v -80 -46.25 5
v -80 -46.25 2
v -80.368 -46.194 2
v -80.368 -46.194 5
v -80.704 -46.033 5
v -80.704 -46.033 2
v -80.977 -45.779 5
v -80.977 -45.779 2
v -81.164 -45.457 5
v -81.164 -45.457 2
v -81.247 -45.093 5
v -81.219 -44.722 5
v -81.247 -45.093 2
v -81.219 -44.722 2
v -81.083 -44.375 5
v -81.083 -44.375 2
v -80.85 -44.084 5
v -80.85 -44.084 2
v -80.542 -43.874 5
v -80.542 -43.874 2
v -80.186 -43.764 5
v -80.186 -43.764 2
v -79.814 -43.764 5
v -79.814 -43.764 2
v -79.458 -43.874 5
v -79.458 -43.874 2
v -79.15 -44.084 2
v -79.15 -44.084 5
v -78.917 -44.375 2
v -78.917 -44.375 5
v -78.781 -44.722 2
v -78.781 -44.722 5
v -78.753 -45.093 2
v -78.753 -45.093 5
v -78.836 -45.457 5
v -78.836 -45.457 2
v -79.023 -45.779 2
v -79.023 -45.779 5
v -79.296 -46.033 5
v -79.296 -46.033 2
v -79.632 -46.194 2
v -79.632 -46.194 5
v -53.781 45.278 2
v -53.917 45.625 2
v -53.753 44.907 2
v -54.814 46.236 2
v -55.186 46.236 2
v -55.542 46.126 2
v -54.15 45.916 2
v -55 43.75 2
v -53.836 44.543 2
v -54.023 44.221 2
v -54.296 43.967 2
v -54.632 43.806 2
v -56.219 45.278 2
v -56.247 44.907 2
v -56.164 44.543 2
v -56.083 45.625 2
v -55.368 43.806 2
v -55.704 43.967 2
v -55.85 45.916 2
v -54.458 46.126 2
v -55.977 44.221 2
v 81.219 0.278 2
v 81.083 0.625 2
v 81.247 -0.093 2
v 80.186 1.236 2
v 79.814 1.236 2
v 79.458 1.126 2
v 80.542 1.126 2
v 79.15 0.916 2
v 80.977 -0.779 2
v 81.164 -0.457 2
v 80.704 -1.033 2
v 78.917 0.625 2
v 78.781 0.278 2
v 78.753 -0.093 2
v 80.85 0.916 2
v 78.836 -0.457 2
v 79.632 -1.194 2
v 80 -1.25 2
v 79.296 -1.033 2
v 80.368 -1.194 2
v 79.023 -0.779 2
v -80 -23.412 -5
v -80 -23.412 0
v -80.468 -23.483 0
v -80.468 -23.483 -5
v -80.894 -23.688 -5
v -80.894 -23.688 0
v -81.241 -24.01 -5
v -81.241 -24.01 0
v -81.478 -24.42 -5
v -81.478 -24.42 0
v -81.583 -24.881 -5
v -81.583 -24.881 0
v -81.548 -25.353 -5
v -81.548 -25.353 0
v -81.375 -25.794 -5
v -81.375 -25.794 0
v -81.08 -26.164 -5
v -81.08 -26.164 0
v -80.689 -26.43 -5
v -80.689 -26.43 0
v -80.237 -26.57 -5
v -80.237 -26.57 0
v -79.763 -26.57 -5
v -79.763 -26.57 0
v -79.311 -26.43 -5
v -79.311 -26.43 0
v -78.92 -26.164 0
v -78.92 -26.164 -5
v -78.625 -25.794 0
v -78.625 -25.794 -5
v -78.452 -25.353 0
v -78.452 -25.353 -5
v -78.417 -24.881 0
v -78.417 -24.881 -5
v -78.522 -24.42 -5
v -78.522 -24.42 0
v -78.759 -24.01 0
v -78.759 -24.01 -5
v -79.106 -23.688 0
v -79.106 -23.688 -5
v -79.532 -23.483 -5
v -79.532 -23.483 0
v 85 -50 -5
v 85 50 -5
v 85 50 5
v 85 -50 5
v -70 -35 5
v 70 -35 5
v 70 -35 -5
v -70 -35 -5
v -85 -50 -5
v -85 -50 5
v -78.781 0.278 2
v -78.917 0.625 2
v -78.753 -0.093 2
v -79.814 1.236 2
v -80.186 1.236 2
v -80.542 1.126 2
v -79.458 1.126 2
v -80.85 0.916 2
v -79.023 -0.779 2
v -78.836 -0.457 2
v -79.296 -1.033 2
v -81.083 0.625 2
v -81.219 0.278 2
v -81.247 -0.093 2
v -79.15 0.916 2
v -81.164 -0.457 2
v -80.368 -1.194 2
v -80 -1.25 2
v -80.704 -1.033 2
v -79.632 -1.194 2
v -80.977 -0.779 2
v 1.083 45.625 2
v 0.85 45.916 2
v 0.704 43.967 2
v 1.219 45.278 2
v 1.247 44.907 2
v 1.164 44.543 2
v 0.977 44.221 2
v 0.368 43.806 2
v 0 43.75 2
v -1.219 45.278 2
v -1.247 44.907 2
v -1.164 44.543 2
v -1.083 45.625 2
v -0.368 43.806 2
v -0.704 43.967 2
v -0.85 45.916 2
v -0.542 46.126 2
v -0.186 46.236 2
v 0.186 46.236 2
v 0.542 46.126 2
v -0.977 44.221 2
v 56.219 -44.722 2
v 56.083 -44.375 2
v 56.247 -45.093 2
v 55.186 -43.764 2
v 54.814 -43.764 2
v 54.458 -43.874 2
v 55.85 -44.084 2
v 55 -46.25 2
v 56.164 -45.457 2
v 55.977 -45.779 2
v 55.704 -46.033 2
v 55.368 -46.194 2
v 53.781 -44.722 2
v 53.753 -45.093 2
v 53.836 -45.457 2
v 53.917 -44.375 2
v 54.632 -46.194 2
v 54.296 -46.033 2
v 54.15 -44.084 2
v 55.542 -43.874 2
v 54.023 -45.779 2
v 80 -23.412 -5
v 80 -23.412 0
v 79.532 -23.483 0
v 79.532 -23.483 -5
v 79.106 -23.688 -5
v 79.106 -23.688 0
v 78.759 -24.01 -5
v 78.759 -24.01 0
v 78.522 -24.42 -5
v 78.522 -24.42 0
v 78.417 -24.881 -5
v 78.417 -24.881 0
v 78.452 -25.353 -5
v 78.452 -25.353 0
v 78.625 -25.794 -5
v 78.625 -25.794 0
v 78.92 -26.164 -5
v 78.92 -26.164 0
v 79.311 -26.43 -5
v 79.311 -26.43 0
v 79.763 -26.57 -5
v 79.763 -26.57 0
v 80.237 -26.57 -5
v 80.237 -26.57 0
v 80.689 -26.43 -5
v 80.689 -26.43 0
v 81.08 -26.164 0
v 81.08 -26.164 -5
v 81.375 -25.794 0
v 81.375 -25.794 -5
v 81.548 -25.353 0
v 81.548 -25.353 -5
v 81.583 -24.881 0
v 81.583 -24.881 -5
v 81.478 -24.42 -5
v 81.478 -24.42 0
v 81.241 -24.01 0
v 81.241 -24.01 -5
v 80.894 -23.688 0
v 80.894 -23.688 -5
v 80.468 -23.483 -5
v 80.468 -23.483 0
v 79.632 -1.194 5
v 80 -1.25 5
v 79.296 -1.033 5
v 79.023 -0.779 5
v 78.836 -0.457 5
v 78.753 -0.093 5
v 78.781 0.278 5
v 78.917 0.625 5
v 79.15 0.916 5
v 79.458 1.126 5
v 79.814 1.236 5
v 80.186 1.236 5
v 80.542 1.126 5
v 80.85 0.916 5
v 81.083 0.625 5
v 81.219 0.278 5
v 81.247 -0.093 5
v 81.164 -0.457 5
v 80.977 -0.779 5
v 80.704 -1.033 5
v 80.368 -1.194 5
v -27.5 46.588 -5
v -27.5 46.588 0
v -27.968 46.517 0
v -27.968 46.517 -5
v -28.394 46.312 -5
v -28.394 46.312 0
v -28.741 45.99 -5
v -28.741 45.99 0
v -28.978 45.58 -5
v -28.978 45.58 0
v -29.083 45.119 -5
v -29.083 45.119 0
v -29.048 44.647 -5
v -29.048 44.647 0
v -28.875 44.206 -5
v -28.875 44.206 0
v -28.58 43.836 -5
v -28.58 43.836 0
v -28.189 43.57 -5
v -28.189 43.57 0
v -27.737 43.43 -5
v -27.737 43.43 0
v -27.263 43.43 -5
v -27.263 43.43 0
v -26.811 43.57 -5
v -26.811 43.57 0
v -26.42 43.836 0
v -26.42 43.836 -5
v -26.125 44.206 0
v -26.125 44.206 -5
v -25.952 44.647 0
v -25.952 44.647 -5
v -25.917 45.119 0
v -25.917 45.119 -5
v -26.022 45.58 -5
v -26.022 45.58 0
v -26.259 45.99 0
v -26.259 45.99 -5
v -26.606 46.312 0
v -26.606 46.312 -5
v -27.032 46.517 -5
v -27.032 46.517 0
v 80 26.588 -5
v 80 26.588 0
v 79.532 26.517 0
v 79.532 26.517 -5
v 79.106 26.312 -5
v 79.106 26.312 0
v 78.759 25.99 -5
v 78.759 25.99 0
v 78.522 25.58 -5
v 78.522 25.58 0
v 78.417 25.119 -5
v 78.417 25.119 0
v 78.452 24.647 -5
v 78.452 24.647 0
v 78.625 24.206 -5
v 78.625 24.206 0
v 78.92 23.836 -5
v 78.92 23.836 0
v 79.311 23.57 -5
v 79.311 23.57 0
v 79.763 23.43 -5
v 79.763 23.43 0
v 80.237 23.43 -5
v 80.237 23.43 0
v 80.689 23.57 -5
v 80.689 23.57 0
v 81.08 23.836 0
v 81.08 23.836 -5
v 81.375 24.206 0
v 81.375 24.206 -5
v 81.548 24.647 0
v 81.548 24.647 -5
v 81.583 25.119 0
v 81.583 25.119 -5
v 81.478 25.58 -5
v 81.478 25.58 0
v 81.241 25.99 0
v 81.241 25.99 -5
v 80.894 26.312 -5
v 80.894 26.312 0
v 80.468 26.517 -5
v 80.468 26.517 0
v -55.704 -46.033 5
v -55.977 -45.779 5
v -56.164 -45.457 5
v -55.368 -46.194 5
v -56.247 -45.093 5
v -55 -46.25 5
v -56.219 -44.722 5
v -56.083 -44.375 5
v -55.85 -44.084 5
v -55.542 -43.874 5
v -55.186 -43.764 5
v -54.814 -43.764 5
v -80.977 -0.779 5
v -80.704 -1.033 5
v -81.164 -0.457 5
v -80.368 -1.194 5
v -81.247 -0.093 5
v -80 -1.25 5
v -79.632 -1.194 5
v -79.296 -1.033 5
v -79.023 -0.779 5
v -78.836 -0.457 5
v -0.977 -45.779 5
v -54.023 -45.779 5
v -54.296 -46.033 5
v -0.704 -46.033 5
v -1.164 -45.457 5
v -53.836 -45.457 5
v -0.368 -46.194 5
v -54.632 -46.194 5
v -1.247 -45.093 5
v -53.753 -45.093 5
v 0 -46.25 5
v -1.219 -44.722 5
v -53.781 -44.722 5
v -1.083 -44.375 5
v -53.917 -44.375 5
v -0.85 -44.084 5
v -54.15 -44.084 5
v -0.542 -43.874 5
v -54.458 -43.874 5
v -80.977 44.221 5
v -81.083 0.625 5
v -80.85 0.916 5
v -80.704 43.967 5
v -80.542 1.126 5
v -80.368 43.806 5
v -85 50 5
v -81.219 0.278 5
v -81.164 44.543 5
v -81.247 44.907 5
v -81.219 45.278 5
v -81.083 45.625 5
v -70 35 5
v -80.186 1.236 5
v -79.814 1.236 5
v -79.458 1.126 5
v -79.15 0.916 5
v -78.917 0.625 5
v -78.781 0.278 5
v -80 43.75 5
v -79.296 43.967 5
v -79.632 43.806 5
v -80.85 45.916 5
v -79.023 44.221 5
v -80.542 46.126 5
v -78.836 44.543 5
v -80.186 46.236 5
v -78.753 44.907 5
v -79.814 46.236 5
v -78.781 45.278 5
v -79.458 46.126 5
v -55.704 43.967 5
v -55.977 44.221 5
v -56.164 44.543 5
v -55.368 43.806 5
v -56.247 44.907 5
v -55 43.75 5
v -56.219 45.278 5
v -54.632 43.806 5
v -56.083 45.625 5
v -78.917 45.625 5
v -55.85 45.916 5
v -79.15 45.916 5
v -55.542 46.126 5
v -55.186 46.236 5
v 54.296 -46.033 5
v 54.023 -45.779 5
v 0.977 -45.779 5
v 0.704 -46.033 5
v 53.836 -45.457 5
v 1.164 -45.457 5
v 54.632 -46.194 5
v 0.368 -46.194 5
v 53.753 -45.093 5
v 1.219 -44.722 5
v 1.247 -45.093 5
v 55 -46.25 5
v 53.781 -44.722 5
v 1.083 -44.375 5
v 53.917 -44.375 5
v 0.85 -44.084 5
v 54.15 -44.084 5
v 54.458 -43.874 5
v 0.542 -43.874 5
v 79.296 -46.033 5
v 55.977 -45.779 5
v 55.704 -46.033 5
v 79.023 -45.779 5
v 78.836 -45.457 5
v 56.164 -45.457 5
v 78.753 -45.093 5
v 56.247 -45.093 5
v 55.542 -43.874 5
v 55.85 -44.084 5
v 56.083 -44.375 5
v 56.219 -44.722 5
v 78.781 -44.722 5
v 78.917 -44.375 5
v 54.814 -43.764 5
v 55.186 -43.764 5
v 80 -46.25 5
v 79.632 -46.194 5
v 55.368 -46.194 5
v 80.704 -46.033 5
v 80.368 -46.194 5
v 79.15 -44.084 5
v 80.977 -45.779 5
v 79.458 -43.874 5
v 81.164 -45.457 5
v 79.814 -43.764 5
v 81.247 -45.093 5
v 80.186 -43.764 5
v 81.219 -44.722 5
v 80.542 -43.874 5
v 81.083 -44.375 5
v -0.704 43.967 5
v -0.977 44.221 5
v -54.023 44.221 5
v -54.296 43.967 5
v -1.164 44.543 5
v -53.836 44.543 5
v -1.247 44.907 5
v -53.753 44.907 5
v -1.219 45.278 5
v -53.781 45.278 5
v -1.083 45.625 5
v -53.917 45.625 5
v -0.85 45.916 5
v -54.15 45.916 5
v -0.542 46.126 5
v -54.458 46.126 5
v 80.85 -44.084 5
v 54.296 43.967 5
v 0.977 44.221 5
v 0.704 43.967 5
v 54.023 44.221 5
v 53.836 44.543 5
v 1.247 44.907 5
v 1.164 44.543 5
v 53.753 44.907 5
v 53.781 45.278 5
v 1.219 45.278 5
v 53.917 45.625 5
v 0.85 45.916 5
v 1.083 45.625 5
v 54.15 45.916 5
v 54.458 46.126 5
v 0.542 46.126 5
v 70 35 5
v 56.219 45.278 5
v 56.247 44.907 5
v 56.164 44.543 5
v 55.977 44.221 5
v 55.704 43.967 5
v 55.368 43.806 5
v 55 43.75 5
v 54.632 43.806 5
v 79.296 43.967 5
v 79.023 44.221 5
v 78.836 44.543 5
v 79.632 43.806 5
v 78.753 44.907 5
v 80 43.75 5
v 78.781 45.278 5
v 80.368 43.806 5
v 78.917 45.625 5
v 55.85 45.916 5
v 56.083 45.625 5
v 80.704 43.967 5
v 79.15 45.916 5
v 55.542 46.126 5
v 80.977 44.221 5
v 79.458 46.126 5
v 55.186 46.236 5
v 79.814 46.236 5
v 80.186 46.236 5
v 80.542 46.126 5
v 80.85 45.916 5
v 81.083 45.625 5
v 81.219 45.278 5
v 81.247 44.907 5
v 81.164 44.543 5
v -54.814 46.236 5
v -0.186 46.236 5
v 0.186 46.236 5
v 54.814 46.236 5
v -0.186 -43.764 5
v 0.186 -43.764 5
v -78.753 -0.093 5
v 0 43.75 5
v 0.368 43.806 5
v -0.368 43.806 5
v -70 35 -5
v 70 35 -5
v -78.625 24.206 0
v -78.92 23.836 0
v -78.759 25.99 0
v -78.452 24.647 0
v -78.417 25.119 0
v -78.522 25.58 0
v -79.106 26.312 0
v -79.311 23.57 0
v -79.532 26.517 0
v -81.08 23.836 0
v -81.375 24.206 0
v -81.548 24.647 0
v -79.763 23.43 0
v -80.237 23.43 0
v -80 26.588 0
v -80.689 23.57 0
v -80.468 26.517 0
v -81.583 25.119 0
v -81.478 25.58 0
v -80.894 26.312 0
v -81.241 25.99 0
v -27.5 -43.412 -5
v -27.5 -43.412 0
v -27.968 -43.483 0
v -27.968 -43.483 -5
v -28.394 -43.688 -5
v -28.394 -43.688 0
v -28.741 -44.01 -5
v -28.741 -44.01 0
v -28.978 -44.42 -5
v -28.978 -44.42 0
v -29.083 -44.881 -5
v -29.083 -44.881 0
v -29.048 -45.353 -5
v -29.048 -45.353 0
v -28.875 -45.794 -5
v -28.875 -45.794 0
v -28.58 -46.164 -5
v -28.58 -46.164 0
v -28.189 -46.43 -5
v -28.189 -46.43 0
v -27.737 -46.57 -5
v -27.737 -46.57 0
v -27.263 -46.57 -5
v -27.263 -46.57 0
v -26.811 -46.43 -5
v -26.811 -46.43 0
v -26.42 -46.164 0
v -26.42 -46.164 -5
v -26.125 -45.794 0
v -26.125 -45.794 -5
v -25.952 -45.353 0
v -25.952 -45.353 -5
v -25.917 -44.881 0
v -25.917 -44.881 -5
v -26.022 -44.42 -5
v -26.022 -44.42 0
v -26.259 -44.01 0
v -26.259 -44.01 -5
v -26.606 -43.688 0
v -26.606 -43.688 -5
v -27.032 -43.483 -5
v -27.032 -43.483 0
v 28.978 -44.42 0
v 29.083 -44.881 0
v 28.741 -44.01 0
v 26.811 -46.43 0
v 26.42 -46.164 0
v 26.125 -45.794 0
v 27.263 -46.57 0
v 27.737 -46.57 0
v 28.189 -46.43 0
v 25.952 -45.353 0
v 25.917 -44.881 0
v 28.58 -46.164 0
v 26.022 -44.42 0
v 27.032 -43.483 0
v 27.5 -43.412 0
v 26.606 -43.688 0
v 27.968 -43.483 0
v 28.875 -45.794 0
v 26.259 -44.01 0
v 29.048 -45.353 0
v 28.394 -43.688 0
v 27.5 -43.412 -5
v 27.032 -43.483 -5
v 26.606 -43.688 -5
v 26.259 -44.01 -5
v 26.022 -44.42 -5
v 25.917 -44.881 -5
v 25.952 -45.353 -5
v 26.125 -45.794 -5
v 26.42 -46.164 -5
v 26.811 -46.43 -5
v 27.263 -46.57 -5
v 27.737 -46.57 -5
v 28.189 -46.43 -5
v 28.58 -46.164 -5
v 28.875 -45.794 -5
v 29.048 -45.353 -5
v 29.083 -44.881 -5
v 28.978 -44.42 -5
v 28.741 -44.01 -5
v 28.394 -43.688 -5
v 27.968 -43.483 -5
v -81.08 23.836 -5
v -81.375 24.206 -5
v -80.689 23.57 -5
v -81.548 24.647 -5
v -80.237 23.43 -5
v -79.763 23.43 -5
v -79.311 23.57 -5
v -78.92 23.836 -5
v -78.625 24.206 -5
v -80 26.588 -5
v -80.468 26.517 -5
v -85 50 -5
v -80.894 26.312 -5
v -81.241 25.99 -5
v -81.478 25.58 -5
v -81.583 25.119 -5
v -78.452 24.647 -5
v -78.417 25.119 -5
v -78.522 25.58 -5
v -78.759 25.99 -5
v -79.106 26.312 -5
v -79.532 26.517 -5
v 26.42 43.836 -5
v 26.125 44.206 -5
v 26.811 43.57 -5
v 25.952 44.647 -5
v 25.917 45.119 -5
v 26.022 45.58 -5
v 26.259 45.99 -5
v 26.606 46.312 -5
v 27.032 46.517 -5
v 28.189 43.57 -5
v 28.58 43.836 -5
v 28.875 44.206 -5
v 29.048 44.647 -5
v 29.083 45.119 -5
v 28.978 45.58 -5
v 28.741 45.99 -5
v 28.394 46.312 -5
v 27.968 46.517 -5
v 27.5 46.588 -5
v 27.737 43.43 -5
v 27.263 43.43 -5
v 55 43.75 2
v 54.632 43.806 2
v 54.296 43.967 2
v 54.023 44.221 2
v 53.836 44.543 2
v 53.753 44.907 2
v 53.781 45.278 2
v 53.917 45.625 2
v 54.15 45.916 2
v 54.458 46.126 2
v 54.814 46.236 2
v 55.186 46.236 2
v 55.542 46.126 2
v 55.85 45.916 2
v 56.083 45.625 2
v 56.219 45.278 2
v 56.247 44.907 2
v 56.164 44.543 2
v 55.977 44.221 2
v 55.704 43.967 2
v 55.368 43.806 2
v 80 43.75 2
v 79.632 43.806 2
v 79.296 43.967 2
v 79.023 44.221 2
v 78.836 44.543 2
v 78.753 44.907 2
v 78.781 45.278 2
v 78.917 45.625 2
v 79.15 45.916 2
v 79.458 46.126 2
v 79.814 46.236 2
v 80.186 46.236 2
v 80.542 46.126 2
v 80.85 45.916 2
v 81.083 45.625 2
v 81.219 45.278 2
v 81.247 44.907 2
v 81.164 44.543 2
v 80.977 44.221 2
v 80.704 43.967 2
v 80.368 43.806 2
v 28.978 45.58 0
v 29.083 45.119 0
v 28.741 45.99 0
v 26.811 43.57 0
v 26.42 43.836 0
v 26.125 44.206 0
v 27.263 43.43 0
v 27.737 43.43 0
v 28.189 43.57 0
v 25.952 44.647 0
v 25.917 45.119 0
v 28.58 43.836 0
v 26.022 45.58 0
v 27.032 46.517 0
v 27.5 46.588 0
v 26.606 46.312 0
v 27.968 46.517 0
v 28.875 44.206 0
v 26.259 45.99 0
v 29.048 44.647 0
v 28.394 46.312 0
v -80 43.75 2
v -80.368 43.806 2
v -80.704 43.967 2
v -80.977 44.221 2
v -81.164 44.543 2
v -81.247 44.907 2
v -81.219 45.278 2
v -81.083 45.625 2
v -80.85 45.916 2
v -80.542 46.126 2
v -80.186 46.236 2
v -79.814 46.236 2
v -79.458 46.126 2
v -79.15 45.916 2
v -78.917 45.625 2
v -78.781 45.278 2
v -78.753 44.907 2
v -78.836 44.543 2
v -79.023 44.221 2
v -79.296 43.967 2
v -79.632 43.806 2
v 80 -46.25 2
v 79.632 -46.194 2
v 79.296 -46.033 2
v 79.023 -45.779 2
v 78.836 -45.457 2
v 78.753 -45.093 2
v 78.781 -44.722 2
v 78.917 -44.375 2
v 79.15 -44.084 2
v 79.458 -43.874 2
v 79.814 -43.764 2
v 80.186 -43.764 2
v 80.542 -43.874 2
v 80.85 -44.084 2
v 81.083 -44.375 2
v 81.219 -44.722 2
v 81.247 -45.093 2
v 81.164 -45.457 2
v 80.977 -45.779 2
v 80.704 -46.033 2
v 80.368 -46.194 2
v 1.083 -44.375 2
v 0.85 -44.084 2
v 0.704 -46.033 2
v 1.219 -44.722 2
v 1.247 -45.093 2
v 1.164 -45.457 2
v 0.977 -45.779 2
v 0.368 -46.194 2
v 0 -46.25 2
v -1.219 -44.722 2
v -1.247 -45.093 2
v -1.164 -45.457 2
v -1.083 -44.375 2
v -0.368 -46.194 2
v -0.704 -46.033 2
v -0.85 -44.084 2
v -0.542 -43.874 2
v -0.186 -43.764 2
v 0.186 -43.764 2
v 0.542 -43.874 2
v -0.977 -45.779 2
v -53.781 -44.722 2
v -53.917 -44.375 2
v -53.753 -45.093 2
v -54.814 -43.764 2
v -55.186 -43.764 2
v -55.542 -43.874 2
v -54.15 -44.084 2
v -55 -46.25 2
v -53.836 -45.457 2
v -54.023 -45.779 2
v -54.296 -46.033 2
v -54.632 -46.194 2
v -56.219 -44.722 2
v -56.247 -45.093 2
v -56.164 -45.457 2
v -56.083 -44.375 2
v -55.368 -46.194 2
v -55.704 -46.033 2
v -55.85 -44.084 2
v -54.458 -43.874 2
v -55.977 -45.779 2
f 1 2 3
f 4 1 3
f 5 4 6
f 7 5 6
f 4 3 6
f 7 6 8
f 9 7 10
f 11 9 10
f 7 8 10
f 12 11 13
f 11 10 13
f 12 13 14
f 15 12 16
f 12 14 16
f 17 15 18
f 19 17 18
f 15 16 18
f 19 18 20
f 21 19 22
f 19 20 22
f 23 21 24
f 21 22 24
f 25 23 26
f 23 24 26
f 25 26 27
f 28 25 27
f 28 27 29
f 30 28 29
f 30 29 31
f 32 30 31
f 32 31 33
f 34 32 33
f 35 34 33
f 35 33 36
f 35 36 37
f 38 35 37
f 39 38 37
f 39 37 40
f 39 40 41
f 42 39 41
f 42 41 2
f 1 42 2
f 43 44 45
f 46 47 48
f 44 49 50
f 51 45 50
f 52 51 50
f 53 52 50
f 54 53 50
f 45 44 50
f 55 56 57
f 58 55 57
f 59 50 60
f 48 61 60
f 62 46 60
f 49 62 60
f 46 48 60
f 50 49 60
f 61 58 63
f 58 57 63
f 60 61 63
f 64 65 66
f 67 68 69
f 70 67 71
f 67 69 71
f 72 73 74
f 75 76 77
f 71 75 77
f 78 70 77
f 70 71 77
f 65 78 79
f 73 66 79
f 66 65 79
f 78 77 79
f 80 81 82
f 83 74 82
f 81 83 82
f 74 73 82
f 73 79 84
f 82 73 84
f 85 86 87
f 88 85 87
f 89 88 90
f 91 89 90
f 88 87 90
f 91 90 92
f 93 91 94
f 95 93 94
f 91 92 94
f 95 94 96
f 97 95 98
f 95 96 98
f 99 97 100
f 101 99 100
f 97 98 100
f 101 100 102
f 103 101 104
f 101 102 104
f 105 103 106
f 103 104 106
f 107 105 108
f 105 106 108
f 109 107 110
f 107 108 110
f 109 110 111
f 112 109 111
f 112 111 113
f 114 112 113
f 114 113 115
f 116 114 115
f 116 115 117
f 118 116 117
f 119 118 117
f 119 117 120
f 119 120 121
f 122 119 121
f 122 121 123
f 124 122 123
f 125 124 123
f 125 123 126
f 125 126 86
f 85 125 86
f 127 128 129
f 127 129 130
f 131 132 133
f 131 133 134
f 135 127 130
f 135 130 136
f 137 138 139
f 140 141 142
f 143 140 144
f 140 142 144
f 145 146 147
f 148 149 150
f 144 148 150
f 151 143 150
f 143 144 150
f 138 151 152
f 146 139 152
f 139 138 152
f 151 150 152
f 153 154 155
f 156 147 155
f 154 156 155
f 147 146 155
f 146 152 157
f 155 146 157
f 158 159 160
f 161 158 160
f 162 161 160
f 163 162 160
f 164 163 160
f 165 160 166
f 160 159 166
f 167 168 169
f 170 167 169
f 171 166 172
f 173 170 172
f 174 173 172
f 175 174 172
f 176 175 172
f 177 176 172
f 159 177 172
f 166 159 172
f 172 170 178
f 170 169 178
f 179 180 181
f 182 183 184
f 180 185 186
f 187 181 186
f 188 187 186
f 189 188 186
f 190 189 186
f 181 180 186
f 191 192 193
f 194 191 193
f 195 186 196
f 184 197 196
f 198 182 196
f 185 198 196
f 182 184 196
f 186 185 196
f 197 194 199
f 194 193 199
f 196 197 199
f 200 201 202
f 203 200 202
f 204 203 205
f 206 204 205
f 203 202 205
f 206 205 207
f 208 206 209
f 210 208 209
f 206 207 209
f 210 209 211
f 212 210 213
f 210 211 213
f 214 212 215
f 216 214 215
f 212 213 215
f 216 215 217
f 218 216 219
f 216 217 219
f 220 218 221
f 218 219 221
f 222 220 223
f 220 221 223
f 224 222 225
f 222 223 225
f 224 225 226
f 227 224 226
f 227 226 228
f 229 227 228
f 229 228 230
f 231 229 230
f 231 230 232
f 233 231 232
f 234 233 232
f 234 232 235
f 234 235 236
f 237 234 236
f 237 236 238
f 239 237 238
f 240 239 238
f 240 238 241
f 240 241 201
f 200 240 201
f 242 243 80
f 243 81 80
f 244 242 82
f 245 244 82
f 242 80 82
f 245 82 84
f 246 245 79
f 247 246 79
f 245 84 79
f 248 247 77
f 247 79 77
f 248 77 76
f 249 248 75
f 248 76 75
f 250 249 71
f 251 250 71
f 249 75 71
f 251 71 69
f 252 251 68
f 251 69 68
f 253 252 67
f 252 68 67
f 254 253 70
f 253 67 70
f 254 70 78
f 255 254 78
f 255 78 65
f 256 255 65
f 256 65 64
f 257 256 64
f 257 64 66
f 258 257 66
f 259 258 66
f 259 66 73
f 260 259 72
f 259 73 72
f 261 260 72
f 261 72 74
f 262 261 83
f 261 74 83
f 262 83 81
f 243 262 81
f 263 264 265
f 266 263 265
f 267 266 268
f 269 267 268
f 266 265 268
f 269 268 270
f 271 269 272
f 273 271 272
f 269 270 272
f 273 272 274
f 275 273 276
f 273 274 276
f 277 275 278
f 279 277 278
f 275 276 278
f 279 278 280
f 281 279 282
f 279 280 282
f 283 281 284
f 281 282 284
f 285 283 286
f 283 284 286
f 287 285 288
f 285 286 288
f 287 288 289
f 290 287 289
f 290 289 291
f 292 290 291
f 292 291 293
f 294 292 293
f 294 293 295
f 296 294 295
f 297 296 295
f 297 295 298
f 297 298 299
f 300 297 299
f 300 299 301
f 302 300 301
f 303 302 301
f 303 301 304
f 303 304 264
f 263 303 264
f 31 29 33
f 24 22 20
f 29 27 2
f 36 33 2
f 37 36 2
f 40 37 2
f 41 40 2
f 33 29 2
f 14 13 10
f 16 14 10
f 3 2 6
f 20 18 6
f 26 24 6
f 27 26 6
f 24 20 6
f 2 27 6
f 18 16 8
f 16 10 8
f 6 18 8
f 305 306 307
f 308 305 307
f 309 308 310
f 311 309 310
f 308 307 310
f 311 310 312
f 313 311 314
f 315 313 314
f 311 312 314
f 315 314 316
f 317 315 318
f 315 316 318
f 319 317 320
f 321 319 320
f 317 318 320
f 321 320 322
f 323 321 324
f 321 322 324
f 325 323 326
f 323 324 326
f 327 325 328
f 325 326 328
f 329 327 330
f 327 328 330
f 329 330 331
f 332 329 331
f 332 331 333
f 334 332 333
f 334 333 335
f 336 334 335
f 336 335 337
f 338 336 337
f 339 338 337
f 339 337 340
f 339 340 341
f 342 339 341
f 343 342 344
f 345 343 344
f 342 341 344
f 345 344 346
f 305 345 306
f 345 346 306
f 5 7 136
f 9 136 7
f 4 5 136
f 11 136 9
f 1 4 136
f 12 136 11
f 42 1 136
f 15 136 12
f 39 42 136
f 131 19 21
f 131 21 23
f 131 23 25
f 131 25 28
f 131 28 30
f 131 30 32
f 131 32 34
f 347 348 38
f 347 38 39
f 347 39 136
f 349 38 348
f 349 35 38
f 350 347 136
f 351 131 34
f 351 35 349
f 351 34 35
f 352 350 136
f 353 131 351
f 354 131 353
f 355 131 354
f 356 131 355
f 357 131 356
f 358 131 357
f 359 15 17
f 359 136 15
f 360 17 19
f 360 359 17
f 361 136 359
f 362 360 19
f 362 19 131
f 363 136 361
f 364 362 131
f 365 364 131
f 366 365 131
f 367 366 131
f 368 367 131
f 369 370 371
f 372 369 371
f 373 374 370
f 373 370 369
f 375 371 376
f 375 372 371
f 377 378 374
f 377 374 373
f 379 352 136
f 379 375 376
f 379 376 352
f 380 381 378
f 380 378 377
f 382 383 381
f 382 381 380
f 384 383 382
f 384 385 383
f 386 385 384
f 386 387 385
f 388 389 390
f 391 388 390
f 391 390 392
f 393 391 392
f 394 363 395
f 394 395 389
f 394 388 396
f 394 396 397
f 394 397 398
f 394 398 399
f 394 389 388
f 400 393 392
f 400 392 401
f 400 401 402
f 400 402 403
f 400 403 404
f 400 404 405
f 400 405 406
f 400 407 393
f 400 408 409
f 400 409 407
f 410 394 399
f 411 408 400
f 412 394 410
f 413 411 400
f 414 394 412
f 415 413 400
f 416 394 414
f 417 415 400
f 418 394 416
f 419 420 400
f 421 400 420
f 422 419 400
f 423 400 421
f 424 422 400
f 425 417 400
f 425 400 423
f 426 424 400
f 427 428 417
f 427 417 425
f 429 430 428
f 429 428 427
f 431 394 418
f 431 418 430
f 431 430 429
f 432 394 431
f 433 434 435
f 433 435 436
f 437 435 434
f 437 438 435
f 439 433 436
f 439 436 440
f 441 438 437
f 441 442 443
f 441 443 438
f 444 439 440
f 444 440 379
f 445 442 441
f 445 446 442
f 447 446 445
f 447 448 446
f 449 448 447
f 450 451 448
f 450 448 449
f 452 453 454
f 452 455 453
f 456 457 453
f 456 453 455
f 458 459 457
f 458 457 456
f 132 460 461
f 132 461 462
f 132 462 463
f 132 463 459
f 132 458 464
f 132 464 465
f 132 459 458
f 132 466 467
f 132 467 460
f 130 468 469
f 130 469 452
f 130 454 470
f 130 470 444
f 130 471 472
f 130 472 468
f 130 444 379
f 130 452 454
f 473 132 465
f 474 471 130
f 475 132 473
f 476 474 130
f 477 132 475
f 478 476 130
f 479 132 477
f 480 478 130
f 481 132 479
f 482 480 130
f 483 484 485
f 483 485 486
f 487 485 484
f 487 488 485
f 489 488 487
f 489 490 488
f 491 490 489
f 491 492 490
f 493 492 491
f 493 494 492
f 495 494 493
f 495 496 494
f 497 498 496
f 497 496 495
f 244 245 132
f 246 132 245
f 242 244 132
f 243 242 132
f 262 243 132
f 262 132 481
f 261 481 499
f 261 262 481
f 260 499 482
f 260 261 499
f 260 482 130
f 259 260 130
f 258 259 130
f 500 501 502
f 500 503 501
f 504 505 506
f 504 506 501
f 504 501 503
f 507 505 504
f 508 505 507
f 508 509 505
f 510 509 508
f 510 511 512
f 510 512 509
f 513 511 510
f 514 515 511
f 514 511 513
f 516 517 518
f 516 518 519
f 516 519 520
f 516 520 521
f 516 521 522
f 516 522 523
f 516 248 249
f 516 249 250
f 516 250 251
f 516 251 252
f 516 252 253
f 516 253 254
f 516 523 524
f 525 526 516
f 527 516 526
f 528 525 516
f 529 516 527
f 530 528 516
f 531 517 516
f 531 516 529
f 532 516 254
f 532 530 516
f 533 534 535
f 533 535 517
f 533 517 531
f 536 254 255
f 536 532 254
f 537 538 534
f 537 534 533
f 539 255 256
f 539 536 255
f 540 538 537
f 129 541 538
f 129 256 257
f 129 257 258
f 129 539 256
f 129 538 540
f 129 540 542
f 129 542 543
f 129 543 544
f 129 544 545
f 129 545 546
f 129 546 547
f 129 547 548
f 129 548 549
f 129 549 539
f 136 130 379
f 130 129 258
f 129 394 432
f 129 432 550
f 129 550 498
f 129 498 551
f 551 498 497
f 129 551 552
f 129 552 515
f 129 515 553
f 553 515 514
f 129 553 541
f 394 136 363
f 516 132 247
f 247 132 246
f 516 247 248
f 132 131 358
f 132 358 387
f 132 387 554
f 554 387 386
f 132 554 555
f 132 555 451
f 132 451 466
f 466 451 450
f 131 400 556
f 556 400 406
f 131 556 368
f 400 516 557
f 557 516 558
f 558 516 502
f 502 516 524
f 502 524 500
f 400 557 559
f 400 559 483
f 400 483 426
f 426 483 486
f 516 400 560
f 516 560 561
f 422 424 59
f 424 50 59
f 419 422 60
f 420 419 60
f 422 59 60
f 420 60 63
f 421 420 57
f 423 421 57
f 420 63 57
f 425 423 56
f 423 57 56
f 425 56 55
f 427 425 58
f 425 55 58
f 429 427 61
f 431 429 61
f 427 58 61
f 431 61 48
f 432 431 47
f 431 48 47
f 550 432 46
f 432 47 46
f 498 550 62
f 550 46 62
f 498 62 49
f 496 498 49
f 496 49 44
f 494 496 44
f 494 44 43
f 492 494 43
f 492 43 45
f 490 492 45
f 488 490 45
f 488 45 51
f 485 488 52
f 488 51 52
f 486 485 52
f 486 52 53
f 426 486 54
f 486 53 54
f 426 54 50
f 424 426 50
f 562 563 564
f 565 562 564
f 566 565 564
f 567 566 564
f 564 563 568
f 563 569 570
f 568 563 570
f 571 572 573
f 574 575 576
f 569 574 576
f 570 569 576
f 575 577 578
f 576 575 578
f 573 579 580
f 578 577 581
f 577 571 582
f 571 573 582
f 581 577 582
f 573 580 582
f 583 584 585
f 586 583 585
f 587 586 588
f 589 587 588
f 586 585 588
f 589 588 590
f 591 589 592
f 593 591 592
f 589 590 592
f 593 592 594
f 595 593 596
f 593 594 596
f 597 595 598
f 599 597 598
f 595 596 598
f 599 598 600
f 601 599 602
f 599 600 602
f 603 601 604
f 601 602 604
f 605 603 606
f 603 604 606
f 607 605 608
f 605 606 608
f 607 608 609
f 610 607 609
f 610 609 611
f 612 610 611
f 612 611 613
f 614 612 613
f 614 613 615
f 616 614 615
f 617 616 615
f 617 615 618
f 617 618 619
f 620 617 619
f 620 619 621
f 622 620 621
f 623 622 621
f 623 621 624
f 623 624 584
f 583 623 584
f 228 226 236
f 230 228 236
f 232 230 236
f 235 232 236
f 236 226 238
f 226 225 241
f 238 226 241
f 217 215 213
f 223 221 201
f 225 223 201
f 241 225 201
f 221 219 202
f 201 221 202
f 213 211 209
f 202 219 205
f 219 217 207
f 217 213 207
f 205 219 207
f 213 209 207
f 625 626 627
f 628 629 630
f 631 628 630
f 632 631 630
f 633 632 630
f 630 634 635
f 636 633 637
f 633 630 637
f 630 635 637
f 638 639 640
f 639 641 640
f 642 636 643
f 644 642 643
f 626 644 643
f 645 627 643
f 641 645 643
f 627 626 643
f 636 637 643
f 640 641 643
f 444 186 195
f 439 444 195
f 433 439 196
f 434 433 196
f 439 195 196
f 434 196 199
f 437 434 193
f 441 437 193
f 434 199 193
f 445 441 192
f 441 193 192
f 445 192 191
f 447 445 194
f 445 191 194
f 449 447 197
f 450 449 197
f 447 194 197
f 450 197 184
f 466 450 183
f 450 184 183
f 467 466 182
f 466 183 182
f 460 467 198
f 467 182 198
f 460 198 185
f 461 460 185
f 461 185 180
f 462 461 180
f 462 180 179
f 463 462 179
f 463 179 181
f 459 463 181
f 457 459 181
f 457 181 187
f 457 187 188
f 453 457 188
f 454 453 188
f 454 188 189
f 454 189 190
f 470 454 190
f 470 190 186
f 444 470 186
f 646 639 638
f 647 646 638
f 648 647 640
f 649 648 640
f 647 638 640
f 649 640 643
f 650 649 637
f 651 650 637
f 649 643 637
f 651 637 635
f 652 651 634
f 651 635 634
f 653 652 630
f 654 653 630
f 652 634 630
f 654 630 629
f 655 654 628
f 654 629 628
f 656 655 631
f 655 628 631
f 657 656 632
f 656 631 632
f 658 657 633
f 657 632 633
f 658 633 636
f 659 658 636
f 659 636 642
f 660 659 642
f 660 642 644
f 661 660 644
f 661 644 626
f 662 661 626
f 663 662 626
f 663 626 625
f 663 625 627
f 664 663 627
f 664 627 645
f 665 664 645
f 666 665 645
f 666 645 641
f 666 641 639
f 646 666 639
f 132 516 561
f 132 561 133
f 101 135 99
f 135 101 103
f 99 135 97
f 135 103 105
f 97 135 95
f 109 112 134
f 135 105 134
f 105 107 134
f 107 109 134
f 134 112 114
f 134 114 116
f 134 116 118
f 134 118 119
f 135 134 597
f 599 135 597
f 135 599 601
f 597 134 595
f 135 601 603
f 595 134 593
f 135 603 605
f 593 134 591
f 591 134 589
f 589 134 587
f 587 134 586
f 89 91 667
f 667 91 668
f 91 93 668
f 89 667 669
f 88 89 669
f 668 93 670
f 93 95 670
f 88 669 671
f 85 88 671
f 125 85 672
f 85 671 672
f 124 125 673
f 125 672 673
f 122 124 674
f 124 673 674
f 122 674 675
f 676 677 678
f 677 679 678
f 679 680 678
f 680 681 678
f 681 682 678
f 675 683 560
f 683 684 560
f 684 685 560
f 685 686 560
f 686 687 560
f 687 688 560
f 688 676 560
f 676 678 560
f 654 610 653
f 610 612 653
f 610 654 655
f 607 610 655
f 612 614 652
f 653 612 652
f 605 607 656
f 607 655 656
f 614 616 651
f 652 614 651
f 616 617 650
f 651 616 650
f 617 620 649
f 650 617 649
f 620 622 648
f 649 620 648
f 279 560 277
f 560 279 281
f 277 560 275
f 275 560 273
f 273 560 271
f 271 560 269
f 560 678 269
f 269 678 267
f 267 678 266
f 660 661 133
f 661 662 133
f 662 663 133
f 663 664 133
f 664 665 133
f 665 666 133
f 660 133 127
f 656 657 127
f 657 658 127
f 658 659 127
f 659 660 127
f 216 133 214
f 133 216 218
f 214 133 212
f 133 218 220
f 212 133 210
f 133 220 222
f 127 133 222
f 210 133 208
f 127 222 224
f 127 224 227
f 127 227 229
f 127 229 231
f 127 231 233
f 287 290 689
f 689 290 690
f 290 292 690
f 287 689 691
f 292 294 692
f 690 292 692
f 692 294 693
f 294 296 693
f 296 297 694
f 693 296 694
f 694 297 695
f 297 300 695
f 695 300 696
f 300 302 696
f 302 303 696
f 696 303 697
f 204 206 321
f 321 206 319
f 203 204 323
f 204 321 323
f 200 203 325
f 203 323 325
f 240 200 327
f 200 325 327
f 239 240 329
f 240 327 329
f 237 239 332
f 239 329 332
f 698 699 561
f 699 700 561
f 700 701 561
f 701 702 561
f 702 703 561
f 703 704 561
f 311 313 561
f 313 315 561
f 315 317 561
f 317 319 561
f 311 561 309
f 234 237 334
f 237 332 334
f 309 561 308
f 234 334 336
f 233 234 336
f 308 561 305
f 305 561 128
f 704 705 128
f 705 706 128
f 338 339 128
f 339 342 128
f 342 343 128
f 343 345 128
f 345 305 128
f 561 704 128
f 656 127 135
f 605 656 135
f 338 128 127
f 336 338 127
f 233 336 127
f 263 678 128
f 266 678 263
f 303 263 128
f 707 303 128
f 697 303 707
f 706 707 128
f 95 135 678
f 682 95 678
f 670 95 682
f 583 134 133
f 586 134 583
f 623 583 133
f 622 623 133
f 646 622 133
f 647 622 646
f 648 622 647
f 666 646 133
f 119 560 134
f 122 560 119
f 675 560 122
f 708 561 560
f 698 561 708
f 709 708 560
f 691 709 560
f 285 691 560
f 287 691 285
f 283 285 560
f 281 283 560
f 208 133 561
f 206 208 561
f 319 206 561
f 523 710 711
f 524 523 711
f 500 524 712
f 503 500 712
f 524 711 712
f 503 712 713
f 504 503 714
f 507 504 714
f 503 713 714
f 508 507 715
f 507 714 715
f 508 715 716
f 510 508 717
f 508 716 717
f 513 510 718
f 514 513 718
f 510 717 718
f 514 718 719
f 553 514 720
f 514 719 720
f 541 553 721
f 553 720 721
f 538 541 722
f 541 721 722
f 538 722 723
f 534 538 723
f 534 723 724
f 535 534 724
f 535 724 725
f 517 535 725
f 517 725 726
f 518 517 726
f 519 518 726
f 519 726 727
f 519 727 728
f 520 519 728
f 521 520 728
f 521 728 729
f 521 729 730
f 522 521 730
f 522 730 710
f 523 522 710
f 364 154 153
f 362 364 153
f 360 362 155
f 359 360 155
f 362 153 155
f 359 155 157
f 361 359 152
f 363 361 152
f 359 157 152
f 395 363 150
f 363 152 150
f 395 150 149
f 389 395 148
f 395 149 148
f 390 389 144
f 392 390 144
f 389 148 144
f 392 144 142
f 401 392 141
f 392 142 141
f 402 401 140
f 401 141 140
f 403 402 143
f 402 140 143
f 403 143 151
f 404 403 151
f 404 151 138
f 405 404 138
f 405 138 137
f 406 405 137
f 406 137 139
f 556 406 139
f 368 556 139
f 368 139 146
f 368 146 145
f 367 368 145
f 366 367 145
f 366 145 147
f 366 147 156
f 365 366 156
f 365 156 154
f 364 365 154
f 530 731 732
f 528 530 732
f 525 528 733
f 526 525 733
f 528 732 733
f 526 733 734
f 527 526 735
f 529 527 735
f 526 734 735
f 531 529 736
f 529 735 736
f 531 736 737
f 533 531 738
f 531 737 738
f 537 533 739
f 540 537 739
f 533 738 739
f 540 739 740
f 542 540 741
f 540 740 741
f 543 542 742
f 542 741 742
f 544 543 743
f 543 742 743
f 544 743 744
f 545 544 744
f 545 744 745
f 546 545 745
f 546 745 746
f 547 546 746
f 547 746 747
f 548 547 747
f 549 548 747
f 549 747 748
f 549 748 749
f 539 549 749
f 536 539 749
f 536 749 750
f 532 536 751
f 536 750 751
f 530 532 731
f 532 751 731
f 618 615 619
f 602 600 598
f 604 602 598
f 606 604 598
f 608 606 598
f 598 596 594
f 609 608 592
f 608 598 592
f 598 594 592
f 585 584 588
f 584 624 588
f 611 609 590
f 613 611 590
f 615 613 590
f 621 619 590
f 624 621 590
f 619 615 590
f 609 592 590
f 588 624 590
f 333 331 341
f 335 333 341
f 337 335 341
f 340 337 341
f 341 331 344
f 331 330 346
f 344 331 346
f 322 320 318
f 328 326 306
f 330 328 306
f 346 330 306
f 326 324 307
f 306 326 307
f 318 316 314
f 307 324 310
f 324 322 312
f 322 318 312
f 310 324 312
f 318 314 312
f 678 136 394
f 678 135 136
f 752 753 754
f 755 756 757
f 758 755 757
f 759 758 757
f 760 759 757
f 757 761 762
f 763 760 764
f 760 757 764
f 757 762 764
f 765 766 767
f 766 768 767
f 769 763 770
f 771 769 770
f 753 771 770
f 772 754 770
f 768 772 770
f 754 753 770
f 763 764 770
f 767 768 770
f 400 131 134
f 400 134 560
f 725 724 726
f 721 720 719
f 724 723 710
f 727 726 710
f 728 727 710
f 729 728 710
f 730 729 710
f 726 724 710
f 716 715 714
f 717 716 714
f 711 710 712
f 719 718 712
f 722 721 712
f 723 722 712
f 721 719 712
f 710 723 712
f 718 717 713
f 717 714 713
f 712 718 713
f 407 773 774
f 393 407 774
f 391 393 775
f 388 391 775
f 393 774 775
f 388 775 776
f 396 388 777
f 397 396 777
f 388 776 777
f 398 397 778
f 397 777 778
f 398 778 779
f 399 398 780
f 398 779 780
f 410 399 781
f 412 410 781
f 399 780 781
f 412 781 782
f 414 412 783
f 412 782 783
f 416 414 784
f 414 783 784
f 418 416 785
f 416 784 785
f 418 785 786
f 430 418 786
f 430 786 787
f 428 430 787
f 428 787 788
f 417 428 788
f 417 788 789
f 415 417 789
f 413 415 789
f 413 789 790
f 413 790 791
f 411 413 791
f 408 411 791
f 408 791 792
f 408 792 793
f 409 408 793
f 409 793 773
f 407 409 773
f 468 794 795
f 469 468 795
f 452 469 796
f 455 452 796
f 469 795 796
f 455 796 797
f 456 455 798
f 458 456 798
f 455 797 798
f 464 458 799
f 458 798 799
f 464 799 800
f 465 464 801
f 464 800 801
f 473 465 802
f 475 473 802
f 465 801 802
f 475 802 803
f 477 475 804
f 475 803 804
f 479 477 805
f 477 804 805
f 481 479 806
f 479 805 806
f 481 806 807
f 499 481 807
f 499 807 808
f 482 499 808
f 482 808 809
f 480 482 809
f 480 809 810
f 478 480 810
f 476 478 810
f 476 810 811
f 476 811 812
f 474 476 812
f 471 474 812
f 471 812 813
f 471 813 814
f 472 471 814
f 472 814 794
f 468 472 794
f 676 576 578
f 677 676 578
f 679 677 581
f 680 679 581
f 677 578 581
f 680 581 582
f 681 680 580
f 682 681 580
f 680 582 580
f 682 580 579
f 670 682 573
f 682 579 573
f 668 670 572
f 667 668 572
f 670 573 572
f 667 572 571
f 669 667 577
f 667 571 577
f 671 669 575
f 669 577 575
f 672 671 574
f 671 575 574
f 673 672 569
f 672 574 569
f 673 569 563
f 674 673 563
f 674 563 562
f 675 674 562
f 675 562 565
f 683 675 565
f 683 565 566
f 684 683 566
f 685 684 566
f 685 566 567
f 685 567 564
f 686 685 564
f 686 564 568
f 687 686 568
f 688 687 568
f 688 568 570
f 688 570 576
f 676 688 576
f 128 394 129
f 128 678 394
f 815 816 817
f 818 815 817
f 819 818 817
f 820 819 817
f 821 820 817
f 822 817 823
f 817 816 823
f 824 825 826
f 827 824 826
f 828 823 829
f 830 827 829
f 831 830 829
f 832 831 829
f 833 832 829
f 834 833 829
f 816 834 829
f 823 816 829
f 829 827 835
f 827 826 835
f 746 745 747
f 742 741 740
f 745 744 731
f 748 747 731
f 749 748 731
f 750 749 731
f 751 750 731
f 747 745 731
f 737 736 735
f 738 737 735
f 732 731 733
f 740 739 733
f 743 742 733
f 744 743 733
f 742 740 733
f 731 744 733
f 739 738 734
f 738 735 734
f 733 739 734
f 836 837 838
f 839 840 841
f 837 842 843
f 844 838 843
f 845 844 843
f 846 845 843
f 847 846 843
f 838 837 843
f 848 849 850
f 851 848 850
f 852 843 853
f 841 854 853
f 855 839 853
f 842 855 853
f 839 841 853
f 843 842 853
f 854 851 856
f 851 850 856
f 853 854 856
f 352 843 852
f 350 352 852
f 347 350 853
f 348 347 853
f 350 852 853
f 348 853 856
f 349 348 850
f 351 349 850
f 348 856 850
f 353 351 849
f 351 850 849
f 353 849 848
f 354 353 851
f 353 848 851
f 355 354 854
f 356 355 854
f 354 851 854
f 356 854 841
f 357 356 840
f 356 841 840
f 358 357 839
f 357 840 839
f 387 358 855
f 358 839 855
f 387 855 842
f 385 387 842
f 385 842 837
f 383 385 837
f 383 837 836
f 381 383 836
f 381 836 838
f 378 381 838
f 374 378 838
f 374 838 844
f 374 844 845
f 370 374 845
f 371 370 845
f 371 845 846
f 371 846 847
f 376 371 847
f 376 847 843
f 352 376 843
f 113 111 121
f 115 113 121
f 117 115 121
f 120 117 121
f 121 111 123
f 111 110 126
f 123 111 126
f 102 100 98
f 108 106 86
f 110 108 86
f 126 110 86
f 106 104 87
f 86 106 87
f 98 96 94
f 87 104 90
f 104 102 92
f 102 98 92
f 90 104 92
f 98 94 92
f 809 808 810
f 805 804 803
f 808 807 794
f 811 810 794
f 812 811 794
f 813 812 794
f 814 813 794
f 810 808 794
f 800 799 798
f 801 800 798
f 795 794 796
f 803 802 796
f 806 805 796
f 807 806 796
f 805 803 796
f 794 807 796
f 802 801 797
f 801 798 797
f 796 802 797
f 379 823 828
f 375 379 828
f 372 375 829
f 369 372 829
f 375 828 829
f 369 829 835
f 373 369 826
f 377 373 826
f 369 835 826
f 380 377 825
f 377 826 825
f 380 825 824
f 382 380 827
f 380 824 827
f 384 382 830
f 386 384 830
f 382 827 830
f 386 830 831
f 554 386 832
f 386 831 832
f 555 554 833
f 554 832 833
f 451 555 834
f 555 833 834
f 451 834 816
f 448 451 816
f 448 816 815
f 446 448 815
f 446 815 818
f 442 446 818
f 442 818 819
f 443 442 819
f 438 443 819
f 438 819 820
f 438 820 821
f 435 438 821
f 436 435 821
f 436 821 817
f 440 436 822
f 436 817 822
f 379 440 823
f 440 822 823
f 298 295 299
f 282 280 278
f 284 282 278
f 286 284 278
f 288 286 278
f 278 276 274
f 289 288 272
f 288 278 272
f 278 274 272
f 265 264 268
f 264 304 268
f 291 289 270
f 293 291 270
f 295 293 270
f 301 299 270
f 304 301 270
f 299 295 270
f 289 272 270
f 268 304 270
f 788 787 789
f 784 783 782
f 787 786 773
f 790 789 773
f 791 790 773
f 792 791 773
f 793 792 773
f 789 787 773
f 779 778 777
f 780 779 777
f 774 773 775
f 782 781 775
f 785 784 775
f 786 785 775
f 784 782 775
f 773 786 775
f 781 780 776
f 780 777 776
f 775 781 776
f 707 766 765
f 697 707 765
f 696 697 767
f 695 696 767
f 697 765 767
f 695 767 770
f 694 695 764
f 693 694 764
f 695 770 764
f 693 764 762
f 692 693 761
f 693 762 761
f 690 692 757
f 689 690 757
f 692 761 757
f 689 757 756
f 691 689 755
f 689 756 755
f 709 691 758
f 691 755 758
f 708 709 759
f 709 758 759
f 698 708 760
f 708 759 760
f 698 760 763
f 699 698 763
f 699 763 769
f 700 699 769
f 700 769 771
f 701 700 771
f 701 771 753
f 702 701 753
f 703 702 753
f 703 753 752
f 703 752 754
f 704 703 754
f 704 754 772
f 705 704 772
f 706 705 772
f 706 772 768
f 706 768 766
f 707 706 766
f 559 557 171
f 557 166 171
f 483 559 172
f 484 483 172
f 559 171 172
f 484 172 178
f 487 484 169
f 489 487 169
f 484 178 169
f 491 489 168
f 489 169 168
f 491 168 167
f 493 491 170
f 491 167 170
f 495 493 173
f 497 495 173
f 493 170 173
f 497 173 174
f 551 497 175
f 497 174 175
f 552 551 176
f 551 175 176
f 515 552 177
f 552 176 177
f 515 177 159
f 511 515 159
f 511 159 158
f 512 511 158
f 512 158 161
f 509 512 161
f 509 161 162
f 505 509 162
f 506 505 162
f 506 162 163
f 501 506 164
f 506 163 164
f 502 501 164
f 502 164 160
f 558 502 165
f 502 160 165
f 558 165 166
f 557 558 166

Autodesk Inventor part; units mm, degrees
ref_plane "YZ Plane" through (0, 0, 0) normal (1, 0, 0) x (0, 1, 0)
ref_plane "XZ Plane" through (0, 0, 0) normal (0, 1, 0) x (-1, 0, 0)
ref_plane "XY Plane" through (0, 0, 0) normal (0, 0, 1) x (1, 0, 0)
sketch "Sketch1" plane through (0, 0, 0) normal (0, 0, 1) x (1, 0, 0)
  line L0 (-85, 50) -> (85, 50)
  line L1 (85, 50) -> (85, -50)
  line L2 (85, -50) -> (-85, -50)
  line L3 (-85, -50) -> (-85, 50)
  line L4 (-85, 50) -> (85, -50) construction
  line L5 (85, 50) -> (-85, -50) construction
  point P0 (0, 0)
  dimension "d0" = 170
  dimension "d1" = 100
extrude "Extrusion1" add sketch "Sketch1" along normal mid plane 10
sketch "Sketch2" plane through (0, 0, 5) normal (0, 0, 1) x (1, 0, 0)
  line L0 (-70, 35) -> (70, 35)
  line L1 (70, 35) -> (70, -35)
  line L2 (70, -35) -> (-70, -35)
  line L3 (-70, -35) -> (-70, 35)
  line L4 (-70, 35) -> (70, -35) construction
  line L5 (70, 35) -> (-70, -35) construction
  point P0 (0, 0)
  dimension "d4" = 140
  dimension "d5" = 70
extrude "Extrusion2" cut sketch "Sketch2" against normal blind 10
sketch "Sketch3" plane through (0, 0, -5) normal (0, 0, -1) x (-1, 0, 0)
  line L0 (-85, -50) -> (85, -50) projected
  line L1 (-85, 50) -> (-85, -50) projected
  line L2 (-85, 50) -> (85, 50) projected
  point P0 (0, 0)
  point P1 (-27.5, -45)
  point P2 (-80, 25)
  point P3 (-80, -25)
  point P4 (80, 25)
  point P5 (80, -25)
  point P6 (27.5, -45)
  point P7 (-27.5, 45)
  point P8 (27.5, 45)
  dimension "d45" = 5
  dimension "d55" = 50
  dimension "d62" = 160
  dimension "d131" = 25
  dimension "d156" = 57.5
  dimension "d159" = 55
  dimension "d162" = 90
hole "Hole1" at (27.5, -45, -5) at (80, -25, -5) at (80, 25, -5) at (-80, -25, -5) at (-80, 25, -5) at (27.5, 45, -5) at (-27.5, 45, -5) at (-27.5, -45, -5) direction (0, 0, 1) diameter 3.175 depth 5
sketch "Sketch4" plane through (0, 0, 5) normal (0, 0, 1) x (1, 0, 0)
  line L0 (-85, 50) -> (-85, -50) projected
  line L1 (85, 50) -> (-85, 50) projected
  line L2 (-85, -50) -> (85, -50) projected
  line L3 (85, -50) -> (85, 50) projected
  point P0 (0, 0)
  point P1 (-80, 0)
  point P2 (-80, -45)
  point P3 (0, -45)
  point P4 (-55, -45)
  point P5 (55, -45)
  point P6 (80, -45)
  point P7 (80, 0)
  point P8 (-80, 45)
  point P9 (-55, 45)
  point P10 (55, 45)
  point P11 (0, 45)
  point P12 (80, 45)
  dimension "d3" = 0
  dimension "d72" = 50
  dimension "d73" = 5
  dimension "d74" = 5
  dimension "d75" = 85
  dimension "d78" = 25
  dimension "d80" = 5
  dimension "d81" = 5
  dimension "d82" = 25
  dimension "d85" = 160
  dimension "d115" = 5
  dimension "d116" = 5
  dimension "d117" = 5
  dimension "d120" = 90
  dimension "d125" = 45
hole "Hole2" at (-80, 0, 5) at (-80, -45, 5) at (0, -45, 5) at (-55, -45, 5) at (55, -45, 5) at (80, -45, 5) at (80, 0, 5) at (80, 45, 5) at (55, 45, 5) at (0, 45, 5) at (-55, 45, 5) at (-80, 45, 5) direction (0, 0, -1) diameter 2.5 depth 3
properties part number "top"
